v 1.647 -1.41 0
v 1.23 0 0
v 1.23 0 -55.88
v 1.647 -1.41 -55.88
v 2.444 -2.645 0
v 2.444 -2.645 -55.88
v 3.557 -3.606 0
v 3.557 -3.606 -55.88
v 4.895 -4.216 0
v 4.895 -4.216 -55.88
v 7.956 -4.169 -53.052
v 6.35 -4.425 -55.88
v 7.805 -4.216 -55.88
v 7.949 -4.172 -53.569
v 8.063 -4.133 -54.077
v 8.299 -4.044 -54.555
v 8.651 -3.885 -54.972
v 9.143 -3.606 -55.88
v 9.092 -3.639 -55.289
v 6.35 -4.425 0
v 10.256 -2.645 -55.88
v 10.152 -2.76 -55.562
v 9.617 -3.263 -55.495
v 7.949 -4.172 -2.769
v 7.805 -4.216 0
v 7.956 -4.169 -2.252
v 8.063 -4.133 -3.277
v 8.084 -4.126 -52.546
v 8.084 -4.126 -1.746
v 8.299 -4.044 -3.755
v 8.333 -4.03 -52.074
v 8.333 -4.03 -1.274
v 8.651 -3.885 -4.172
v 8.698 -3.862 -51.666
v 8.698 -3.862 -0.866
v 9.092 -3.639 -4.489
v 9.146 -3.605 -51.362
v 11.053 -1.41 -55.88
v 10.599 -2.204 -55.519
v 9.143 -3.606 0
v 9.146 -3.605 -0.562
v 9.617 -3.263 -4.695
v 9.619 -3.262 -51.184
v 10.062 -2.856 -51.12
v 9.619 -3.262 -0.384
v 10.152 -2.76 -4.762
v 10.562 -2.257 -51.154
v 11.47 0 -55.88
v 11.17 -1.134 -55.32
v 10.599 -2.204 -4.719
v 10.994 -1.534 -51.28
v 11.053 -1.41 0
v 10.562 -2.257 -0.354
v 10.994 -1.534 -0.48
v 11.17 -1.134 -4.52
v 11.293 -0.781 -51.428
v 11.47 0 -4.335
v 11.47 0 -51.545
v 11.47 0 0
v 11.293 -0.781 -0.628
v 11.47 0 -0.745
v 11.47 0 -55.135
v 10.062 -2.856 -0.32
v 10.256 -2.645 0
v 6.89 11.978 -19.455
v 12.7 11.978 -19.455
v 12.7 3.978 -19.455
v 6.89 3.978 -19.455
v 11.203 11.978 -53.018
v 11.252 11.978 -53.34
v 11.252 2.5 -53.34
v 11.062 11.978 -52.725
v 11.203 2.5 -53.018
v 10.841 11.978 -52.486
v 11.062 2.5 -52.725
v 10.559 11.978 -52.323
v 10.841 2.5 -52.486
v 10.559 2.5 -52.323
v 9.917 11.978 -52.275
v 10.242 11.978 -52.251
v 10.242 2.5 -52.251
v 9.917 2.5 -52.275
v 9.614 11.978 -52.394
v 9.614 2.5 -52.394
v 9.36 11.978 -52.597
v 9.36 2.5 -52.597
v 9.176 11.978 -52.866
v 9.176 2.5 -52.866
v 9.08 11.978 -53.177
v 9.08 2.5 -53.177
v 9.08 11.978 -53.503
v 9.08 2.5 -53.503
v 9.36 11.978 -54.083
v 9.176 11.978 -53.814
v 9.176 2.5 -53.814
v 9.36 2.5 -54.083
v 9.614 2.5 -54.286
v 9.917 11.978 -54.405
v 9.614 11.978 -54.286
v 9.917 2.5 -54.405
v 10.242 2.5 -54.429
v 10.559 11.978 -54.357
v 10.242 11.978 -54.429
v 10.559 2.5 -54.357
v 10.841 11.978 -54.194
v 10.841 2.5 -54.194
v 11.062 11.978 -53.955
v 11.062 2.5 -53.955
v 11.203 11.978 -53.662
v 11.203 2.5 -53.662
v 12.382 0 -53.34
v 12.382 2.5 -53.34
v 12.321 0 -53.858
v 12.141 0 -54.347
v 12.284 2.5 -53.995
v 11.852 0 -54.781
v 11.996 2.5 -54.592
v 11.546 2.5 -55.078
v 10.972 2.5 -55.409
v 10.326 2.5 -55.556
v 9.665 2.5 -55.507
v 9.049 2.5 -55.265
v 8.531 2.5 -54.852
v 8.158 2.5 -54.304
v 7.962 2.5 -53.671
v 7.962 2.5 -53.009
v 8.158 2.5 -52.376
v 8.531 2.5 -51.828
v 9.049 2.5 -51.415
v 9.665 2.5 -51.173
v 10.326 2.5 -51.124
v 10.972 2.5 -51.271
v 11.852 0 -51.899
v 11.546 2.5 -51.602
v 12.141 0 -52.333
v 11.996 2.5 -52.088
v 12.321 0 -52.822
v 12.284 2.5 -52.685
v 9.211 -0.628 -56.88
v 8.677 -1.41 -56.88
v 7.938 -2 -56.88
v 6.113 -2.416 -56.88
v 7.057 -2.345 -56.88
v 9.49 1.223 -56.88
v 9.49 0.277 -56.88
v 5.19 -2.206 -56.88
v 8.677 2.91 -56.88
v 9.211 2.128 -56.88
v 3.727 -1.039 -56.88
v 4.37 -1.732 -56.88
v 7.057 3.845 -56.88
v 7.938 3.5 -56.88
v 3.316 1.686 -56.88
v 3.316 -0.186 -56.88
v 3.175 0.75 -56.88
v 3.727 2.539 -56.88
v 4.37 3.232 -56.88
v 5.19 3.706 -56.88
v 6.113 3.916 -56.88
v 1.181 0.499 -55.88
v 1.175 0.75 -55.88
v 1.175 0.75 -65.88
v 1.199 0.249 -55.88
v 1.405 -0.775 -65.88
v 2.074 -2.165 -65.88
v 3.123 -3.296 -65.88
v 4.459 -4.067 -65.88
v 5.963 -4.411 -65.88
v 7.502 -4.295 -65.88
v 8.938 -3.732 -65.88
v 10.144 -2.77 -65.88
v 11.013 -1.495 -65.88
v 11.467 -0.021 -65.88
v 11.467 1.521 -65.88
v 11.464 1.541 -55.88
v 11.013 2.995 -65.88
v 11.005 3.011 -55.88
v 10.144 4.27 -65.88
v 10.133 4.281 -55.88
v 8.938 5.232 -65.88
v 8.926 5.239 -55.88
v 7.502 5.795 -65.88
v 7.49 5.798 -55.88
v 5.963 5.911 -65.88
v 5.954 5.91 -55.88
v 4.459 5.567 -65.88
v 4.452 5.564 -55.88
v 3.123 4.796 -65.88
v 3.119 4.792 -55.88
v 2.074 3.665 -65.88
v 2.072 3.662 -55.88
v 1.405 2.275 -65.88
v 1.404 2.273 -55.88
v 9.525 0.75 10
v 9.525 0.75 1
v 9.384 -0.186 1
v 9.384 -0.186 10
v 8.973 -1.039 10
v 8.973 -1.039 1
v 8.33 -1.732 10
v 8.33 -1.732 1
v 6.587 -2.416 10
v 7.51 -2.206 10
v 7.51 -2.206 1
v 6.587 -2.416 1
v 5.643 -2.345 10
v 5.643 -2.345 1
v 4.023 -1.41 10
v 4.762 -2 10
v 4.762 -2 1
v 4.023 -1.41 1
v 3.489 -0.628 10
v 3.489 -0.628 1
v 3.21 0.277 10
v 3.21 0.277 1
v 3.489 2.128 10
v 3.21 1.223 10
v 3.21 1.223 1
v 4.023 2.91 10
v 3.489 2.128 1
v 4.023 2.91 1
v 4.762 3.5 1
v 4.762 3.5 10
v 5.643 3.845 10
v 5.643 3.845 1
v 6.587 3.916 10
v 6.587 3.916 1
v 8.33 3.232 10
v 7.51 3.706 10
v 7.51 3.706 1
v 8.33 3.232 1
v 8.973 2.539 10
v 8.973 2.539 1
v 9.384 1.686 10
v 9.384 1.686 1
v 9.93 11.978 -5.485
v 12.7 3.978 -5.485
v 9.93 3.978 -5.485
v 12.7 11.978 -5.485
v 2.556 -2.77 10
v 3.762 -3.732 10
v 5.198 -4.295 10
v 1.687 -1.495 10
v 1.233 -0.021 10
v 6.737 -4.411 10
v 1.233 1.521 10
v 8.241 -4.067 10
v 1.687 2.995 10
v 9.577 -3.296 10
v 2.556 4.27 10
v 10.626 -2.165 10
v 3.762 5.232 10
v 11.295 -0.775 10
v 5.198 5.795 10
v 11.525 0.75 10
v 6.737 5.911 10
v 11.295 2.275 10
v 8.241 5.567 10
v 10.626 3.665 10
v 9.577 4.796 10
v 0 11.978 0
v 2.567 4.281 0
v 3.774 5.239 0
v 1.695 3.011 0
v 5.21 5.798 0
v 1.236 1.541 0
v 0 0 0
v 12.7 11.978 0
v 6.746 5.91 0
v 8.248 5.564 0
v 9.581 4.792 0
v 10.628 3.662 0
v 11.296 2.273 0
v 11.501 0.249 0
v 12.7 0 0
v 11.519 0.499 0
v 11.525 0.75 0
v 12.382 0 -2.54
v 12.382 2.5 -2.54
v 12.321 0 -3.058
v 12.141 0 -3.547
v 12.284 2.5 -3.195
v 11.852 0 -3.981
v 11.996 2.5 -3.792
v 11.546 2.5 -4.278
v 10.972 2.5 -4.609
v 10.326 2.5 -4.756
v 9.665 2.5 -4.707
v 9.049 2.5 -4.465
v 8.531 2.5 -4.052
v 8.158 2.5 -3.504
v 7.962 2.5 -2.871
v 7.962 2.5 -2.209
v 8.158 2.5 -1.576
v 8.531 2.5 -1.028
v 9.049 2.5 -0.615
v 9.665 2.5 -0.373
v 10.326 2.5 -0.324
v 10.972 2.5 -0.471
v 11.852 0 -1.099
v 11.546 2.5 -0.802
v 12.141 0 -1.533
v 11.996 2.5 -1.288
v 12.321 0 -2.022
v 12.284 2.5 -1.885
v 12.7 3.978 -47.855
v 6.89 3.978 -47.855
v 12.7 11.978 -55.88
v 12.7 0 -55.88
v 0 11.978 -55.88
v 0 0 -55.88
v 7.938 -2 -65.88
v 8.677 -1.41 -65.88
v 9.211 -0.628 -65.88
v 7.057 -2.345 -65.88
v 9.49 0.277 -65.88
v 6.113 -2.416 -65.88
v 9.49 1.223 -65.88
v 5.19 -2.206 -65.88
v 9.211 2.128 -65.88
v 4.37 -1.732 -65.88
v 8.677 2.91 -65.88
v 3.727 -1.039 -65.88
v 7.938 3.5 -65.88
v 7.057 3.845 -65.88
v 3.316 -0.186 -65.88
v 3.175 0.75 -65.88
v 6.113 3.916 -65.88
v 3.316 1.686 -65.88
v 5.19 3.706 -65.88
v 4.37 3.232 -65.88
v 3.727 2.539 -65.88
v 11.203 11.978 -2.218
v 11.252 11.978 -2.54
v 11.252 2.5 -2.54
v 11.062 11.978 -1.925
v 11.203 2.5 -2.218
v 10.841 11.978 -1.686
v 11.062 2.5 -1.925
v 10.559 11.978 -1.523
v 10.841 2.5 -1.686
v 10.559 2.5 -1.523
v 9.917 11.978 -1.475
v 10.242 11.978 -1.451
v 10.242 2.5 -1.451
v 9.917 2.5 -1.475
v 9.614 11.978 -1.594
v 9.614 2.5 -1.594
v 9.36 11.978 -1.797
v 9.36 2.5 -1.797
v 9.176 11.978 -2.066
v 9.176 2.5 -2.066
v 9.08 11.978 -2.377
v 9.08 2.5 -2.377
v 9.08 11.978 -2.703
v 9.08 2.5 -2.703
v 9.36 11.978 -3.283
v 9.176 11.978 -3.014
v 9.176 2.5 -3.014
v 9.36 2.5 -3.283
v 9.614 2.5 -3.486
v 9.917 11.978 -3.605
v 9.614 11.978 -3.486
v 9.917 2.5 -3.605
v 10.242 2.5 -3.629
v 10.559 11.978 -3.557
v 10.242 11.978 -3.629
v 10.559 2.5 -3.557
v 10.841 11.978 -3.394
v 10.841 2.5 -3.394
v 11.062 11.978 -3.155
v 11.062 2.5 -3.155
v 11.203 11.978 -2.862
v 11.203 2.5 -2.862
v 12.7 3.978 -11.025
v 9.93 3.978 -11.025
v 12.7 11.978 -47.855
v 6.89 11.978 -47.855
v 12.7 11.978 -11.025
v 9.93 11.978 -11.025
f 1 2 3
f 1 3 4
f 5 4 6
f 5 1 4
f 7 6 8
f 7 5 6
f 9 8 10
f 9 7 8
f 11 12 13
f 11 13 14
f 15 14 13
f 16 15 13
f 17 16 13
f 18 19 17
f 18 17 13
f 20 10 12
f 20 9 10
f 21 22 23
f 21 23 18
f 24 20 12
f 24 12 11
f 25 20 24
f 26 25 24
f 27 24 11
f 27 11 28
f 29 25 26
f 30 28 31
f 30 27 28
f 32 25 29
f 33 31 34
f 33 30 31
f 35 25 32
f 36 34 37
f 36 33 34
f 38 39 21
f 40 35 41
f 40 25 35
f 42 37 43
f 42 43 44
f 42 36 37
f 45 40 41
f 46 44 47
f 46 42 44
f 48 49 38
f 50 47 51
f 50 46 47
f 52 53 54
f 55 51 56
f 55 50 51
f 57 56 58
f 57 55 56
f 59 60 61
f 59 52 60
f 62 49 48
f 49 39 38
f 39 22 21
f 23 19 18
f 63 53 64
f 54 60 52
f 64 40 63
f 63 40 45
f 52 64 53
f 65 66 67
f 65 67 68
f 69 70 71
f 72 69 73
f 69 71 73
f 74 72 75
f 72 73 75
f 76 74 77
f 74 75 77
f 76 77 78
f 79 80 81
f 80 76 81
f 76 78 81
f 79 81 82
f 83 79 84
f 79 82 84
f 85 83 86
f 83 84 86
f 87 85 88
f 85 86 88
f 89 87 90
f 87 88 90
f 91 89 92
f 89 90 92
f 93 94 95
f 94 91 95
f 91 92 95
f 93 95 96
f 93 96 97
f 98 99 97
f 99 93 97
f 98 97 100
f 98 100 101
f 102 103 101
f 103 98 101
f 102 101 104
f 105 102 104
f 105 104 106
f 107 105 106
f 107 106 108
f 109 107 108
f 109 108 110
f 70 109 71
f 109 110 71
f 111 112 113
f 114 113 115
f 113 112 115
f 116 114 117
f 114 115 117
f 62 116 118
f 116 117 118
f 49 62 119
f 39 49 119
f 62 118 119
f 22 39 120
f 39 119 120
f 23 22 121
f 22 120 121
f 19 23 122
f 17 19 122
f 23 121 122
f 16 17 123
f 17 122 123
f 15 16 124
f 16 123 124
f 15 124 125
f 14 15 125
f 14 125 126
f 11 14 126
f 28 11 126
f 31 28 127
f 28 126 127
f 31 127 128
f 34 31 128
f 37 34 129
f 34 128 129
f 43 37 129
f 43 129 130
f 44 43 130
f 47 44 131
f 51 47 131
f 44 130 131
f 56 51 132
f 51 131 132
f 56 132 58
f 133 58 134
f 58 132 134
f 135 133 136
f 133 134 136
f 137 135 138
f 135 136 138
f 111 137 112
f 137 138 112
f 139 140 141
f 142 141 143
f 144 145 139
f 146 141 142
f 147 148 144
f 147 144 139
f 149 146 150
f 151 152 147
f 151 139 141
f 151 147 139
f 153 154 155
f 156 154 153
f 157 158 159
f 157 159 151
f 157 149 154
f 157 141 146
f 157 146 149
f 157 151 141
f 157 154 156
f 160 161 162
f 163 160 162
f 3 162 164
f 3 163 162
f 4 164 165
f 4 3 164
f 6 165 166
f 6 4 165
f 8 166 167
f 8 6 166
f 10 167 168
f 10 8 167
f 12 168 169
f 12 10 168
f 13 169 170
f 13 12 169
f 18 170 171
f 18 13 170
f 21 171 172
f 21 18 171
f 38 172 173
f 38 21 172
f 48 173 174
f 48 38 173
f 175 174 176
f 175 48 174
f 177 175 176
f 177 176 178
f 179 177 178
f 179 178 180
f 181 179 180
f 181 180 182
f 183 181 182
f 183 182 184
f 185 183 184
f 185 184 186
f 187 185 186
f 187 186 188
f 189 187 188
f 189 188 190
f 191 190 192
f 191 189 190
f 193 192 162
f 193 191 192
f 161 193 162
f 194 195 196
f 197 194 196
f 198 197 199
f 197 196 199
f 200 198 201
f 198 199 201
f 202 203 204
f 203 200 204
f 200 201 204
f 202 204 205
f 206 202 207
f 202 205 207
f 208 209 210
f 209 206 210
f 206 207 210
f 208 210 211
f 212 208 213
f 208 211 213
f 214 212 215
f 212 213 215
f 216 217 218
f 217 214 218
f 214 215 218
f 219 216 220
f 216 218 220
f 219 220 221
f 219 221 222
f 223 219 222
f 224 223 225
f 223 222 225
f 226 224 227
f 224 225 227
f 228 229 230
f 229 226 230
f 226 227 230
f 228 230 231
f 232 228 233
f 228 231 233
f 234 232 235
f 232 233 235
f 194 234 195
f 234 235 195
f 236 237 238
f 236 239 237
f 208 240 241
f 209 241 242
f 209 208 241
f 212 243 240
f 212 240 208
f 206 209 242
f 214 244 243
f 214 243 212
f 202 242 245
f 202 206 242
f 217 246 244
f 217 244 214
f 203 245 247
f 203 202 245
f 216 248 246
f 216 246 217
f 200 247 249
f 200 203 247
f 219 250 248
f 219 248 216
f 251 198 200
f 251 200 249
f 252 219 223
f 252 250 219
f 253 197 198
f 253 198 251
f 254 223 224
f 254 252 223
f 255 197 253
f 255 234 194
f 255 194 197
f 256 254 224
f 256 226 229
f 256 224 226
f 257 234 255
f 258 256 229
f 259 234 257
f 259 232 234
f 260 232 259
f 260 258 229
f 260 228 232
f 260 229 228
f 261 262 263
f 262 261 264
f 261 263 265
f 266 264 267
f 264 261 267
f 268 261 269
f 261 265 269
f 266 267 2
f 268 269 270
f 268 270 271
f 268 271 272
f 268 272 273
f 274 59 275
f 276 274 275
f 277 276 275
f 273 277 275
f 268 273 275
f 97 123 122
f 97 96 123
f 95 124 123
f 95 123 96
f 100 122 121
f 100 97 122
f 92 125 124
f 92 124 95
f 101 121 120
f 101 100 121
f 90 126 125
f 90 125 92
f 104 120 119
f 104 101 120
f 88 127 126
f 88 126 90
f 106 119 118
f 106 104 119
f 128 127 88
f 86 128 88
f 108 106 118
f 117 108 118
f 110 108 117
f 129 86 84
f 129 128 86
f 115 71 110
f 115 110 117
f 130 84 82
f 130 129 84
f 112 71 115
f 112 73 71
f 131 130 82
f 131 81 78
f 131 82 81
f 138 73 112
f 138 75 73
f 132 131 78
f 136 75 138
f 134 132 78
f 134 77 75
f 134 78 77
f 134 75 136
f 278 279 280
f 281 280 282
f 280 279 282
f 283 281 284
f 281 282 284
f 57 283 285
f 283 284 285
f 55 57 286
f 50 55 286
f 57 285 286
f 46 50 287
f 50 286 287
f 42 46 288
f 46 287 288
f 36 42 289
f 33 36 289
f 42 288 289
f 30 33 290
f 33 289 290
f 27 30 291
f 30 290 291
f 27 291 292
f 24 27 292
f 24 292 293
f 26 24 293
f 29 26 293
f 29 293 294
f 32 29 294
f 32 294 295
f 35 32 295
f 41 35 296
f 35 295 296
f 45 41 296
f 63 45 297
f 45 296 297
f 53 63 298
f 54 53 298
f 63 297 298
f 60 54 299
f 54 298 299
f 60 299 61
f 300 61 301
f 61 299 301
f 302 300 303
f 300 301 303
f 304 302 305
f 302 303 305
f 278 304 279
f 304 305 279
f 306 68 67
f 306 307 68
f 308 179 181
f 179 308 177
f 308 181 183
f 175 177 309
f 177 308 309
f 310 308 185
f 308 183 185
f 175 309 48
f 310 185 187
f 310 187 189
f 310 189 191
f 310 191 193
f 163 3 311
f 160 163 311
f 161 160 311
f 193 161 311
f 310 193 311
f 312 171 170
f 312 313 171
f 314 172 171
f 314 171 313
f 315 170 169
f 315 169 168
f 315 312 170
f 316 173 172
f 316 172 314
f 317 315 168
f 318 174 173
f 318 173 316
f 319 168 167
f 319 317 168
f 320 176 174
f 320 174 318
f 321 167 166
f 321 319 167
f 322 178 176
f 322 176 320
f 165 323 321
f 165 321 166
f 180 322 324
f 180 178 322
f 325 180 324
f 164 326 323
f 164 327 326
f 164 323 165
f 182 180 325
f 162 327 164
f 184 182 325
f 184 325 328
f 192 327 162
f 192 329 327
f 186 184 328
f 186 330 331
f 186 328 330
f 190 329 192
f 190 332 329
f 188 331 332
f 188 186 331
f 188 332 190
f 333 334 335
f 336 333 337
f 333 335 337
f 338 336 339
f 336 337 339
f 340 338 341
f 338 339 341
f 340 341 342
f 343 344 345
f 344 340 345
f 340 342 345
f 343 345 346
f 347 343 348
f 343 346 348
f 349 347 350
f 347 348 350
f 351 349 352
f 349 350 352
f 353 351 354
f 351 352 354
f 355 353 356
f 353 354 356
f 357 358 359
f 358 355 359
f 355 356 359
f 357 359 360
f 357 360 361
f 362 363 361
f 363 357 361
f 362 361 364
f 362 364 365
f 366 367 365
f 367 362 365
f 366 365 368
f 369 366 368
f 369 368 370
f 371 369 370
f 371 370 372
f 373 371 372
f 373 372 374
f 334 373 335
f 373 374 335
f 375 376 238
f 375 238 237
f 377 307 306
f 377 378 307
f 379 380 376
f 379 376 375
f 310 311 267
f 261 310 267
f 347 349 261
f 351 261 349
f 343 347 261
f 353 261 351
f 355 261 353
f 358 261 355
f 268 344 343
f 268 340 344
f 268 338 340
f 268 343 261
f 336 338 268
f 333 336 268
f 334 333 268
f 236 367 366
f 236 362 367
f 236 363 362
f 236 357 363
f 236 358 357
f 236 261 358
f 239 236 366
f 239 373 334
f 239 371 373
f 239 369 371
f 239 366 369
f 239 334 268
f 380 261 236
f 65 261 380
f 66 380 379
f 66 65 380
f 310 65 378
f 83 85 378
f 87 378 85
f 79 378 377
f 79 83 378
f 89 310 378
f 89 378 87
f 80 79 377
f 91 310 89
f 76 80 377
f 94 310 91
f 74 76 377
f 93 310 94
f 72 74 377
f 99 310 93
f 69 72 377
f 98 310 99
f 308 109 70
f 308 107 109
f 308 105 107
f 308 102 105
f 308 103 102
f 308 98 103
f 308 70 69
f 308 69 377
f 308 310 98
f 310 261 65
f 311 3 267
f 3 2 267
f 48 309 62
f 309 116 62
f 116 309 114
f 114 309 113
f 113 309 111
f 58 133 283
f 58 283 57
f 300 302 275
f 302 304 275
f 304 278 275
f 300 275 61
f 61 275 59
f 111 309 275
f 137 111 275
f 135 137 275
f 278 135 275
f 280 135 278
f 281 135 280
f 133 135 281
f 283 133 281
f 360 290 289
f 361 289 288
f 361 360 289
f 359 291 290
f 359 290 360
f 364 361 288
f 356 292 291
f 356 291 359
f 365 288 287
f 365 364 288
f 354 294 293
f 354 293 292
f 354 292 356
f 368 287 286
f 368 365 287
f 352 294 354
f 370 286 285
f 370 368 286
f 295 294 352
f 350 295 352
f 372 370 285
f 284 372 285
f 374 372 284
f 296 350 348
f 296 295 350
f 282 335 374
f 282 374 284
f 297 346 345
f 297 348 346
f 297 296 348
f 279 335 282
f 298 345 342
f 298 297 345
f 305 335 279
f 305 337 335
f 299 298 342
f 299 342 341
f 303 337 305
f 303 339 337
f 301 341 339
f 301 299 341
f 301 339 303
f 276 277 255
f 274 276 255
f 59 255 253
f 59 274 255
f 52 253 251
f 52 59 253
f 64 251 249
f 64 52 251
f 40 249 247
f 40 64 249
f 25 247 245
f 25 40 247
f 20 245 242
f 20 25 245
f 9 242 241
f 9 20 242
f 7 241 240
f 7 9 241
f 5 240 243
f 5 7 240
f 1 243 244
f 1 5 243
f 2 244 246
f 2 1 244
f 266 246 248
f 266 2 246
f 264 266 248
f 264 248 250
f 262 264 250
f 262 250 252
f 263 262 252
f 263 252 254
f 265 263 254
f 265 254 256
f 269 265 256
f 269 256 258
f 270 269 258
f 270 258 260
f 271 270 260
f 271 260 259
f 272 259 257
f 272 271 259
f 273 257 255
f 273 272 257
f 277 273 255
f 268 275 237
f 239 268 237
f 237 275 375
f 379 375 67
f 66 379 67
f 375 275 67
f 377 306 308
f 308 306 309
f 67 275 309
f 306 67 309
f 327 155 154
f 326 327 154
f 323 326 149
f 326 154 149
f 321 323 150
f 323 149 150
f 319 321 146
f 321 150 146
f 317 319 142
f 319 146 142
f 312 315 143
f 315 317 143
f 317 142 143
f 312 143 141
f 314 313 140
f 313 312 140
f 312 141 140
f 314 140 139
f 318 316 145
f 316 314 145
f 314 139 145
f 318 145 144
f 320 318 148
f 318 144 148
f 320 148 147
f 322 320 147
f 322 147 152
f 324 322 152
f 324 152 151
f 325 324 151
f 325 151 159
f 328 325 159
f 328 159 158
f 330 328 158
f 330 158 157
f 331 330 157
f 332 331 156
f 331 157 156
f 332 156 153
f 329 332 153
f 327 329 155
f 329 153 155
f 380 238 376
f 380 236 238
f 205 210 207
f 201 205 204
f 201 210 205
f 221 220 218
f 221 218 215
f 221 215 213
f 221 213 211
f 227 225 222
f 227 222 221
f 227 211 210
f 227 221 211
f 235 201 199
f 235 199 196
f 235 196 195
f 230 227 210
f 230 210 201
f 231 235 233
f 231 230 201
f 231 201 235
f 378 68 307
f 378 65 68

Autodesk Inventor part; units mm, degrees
ref_plane "YZ Plane" through (0, 0, 0) normal (1, 0, 0) x (0, 1, 0)
ref_plane "XZ Plane" through (0, 0, 0) normal (0, 1, 0) x (-1, 0, 0)
ref_plane "XY Plane" through (0, 0, 0) normal (0, 0, 1) x (1, 0, 0)
sketch "Sketch1" plane through (0, 0, 0) normal (0, 1, 0) x (-1, 0, 0)
  line L0 (0, -55.88) -> (-12.7, -55.88)
  line L1 (-12.7, 0) -> (0, 0)
  line L2 (0, 0) -> (0, -20.94)
  line L3 (0, -34.94) -> (0, -55.88)
  line L4 (-12.7, -55.88) -> (-12.7, -34.94)
  line L5 (-12.7, -20.94) -> (-12.7, 0)
  line L6 (0, -20.94) -> (0, -34.94)
  line L7 (-12.7, -20.94) -> (-12.7, -34.94)
  dimension "d1" = 55.88
  dimension "d2" = 12.7
extrude "Extrusion1" add sketch "Sketch1" along normal blind 1.5
sketch "Sketch2" plane through (0, 1.5, 0) normal (0, 1, 0) x (1, 0, 0)
  line L0 (12.7, 0) -> (12.7, 55.88) projected
  line L1 (12.7, 0) -> (10.16, 0)
  line L2 (12.7, 2.54) -> (12.7, 0)
  circle A0 centre (10.16, 2.54) radius 1.092
  circle A1 centre (10.16, 53.34) radius 1.092
  point P0 (0, 0)
  dimension "d8" = 2.184
  dimension "d10" = 2.184
extrude "Extrusion2" cut sketch "Sketch2" against normal blind 1.5
sketch "Sketch5" plane through (0, 0, 0) normal (0, 0, 1) x (1, 0, 0)
  line L0 (12.7, 0) -> (0, 0) projected
  line L1 (6.35, 0) -> (6.35, 1.5)
  line L2 (12.7, 1.5) -> (0, 1.5) projected
  line L3 (0, 0) -> (0, 1.5) projected
  line L4 (0, 0.75) -> (12.7, 0.75)
  line L5 (12.7, 0) -> (12.7, 1.5) projected
  circle A0 centre (6.35, 0.75) radius 5.175
  dimension "d30" = 10.35
extrude "Extrusion5" add sketch "Sketch5" along normal blind 1 contours A0 L0 | L0 L1 L4 A0 | L0 A0 L4 L1 | L4 L1 L2 A0 | L4 A0 L2 L1 | L2 A0
sketch "Sketch6" plane through (6.35, 0.75, 1) normal (0, 0, 1) x (1, 0, 0)
  circle A0 centre (0, 0) radius 5.175
  circle A1 centre (0, 0) radius 3.175
  point P0 (-6.35, -0.75)
  dimension "d35" = 6.35
extrude "Extrusion6" add sketch "Sketch6" along normal blind 9
sketch "Sketch7" plane through (12.7, 0, -55.88) normal (0, 0, -1) x (-1, 0, 0)
  line L0 (0, 0) -> (0, 1.5) projected
  line L1 (0, 0.75) -> (12.7, 0.75)
  line L2 (12.7, 0) -> (12.7, 1.5) projected
  line L3 (11.4704, 1.5) -> (1.2296, 1.5) projected
  line L4 (6.35, 1.5) -> (6.35, 0)
  circle A0 centre (6.35, 0.75) radius 5.175
extrude "Extrusion7" add sketch "Sketch7" along normal blind 1
sketch "Sketch8" plane through (6.35, 0.75, -56.88) normal (0, 0, -1) x (-1, 0, 0)
  circle A0 centre (0, 0) radius 5.175
  circle A1 centre (0, 0) radius 3.175
  point P0 (6.35, -0.75)
  dimension "d40" = 6.35
extrude "Extrusion8" add sketch "Sketch8" along normal blind 9
thread "Thread1" size "1/4-20 UNC" class "2B" standard "ANSI Unified Screw Threads" full length
thread "Thread2" size "1/4-20 UNC" class "2B" standard "ANSI Unified Screw Threads" full length
sketch "Sketch9" plane through (0, 0, 0) normal (0, 0, -1) x (-1, 0, 0)
  arc A0 (-11.4704, 0) -> (-1.2296, 0) centre (-6.35, 0.75) ccw projected
  line L0 (0, 0) -> (-1.2296, 0) projected
  line L1 (-11.4704, 0) -> (-1.2296, 0)
  circle A1 centre (-6.35, 0.75) radius 5.175
extrude "Extrusion9" add sketch "Sketch9" along normal up to next contours L1 A0
sketch "Sketch10" plane through (10.16, 0, -2.54) normal (0, 1, 0) x (1, 0, 0)
  circle A0 centre (0, 0) radius 1.092
  circle A1 centre (0, 50.8) radius 1.092 projected
  circle A2 centre (0, 50.8) radius 1.092
  point P0 (-10.16, -2.54)
  dimension "d60" = 2.184
extrude "Extrusion10" cut sketch "Sketch10" against normal up to next
sketch "Sketch12" plane through (0, 1.5, 0) normal (0, 1, 0) x (1, 0, 0)
  circle A0 centre (10.16, 2.54) radius 1.092 projected
  circle A1 centre (10.16, 2.54) radius 1.092
  circle A2 centre (10.16, 2.54) radius 2.2225
  circle A3 centre (10.16, 53.34) radius 1.092 projected
  circle A4 centre (10.16, 53.34) radius 1.092
  circle A5 centre (10.16, 53.34) radius 2.2225
  point P0 (0, 0)
  dimension "d54" = 4.445
  dimension "d55" = 4.445
extrude "Extrusion11" cut sketch "Sketch12" against normal blind 5.925
sketch "Sketch13" plane through (0, 1.5, 0) normal (0, 1, 0) x (1, 0, 0)
  line L0 (12.7, 0) -> (12.7, 55.88) projected
  line L1 (12.7, 55.88) -> (0, 55.88)
  line L2 (0, 55.88) -> (0, 0)
  line L3 (0, 0) -> (12.7, 0)
  line L4 (12.7, 0) -> (12.7, 55.88)
  circle A0 centre (10.16, 53.34) radius 1.092 projected
  circle A1 centre (10.16, 53.34) radius 1.092
  circle A2 centre (10.16, 2.54) radius 1.092 projected
  circle A3 centre (10.16, 2.54) radius 1.092
extrude "Extrusion12" add sketch "Sketch13" along normal blind 10.4775
thread "Thread5" size "2-56 UNC" class "2B" standard "ANSI Unified Screw Threads" full length
thread "Thread6" size "2-56 UNC" class "2B" standard "ANSI Unified Screw Threads" full length
sketch "Sketch14" plane through (10.16, 1.5, -53.34) normal (0, -1, 0) x (1, 0, 0)
  circle A0 centre (0, 0) radius 1.092 projected
  circle A1 centre (0, 0) radius 2.2225
  circle A2 centre (0, 50.8) radius 2.2225 projected
  circle A3 centre (0, 50.8) radius 2.2225
  circle A4 centre (0, 0) radius 1.092
  circle A5 centre (0, 50.8) radius 1.092
  point P0 (-10.16, 53.34)
extrude "Extrusion13" cut sketch "Sketch14" against normal blind 1
sketch "Sketch15" plane through (0, 11.9775, 0) normal (0, 1, 0) x (1, 0, 0)
  line L0 (12.7, 0) -> (12.7, 6.985)
  line L1 (12.7, 0) -> (12.7, 55.88) projected
  line L2 (12.7, 0) -> (19.685, 0) construction
  line L3 (11.525, -10) -> (11.525, 65.88) projected
  line L4 (11.43, 6.985) -> (13.97, 6.985) construction
  line L5 (11.43, 6.985) -> (12.43, 6.985) construction
  line L6 (11.43, 9.525) -> (12.43, 9.525) construction
  line L7 (12.7, 5.985) -> (12.7, 10.525)
  line L8 (12.7, 5.985) -> (12.7, 5.485)
  line L9 (12.7, 5.485) -> (9.93, 5.485)
  line L10 (9.93, 5.485) -> (9.93, 11.025)
  line L11 (9.93, 11.025) -> (12.7, 11.025)
  line L12 (12.7, 11.025) -> (12.7, 10.525)
  point P0 (0, 0)
  dimension "d72" = 90
  dimension "d130" = 0.5
  dimension "d131" = 2.77
  dimension "d132" = 5.54
extrude "Extrusion14" cut sketch "Sketch15" against normal blind 8
sketch "Sketch16" plane through (0, 11.9775, 0) normal (0, 1, 0) x (1, 0, 0)
  line L0 (12.7, 0) -> (12.7, 55.88) projected
  line L1 (12.7, 40.234) -> (13.97, 40.234) construction
  line L2 (0, 0) -> (12.7, 0) projected
  line L3 (11.43, 0) -> (40.005, 0) construction
  line L4 (11.525, -10) -> (11.525, 65.88) projected
  line L5 (11.43, 28.575) -> (13.97, 28.575) construction
  line L6 (11.43, 46.355) -> (12.43, 46.355) construction
  line L7 (11.43, 28.575) -> (13.97, 28.575) construction
  line L8 (11.43, 20.955) -> (12.43, 20.955) construction
  line L9 (6.89, 19.955) -> (6.89, 47.355)
  line L10 (12.7, 47.355) -> (12.7, 19.955)
  line L11 (6.89, 47.355) -> (6.89, 47.855)
  line L12 (6.89, 47.855) -> (12.7, 47.855)
  line L13 (12.7, 47.855) -> (12.7, 47.355)
  line L14 (12.7, 19.955) -> (12.7, 19.455)
  line L15 (12.7, 0) -> (12.7, 55.88) projected
  line L16 (12.7, 19.455) -> (6.89, 19.455)
  line L17 (6.89, 19.455) -> (6.89, 19.955)
  point P0 (12.7, 10.525)
  dimension "d123" = 5.81
  dimension "d129" = 28.4
extrude "Extrusion15" cut sketch "Sketch16" against normal blind 8 contours L16 L4 L12 L0 | L16 L17 L9 L11 L12 L4
properties part number "Line Sensor 6 Bracket 2.0"
